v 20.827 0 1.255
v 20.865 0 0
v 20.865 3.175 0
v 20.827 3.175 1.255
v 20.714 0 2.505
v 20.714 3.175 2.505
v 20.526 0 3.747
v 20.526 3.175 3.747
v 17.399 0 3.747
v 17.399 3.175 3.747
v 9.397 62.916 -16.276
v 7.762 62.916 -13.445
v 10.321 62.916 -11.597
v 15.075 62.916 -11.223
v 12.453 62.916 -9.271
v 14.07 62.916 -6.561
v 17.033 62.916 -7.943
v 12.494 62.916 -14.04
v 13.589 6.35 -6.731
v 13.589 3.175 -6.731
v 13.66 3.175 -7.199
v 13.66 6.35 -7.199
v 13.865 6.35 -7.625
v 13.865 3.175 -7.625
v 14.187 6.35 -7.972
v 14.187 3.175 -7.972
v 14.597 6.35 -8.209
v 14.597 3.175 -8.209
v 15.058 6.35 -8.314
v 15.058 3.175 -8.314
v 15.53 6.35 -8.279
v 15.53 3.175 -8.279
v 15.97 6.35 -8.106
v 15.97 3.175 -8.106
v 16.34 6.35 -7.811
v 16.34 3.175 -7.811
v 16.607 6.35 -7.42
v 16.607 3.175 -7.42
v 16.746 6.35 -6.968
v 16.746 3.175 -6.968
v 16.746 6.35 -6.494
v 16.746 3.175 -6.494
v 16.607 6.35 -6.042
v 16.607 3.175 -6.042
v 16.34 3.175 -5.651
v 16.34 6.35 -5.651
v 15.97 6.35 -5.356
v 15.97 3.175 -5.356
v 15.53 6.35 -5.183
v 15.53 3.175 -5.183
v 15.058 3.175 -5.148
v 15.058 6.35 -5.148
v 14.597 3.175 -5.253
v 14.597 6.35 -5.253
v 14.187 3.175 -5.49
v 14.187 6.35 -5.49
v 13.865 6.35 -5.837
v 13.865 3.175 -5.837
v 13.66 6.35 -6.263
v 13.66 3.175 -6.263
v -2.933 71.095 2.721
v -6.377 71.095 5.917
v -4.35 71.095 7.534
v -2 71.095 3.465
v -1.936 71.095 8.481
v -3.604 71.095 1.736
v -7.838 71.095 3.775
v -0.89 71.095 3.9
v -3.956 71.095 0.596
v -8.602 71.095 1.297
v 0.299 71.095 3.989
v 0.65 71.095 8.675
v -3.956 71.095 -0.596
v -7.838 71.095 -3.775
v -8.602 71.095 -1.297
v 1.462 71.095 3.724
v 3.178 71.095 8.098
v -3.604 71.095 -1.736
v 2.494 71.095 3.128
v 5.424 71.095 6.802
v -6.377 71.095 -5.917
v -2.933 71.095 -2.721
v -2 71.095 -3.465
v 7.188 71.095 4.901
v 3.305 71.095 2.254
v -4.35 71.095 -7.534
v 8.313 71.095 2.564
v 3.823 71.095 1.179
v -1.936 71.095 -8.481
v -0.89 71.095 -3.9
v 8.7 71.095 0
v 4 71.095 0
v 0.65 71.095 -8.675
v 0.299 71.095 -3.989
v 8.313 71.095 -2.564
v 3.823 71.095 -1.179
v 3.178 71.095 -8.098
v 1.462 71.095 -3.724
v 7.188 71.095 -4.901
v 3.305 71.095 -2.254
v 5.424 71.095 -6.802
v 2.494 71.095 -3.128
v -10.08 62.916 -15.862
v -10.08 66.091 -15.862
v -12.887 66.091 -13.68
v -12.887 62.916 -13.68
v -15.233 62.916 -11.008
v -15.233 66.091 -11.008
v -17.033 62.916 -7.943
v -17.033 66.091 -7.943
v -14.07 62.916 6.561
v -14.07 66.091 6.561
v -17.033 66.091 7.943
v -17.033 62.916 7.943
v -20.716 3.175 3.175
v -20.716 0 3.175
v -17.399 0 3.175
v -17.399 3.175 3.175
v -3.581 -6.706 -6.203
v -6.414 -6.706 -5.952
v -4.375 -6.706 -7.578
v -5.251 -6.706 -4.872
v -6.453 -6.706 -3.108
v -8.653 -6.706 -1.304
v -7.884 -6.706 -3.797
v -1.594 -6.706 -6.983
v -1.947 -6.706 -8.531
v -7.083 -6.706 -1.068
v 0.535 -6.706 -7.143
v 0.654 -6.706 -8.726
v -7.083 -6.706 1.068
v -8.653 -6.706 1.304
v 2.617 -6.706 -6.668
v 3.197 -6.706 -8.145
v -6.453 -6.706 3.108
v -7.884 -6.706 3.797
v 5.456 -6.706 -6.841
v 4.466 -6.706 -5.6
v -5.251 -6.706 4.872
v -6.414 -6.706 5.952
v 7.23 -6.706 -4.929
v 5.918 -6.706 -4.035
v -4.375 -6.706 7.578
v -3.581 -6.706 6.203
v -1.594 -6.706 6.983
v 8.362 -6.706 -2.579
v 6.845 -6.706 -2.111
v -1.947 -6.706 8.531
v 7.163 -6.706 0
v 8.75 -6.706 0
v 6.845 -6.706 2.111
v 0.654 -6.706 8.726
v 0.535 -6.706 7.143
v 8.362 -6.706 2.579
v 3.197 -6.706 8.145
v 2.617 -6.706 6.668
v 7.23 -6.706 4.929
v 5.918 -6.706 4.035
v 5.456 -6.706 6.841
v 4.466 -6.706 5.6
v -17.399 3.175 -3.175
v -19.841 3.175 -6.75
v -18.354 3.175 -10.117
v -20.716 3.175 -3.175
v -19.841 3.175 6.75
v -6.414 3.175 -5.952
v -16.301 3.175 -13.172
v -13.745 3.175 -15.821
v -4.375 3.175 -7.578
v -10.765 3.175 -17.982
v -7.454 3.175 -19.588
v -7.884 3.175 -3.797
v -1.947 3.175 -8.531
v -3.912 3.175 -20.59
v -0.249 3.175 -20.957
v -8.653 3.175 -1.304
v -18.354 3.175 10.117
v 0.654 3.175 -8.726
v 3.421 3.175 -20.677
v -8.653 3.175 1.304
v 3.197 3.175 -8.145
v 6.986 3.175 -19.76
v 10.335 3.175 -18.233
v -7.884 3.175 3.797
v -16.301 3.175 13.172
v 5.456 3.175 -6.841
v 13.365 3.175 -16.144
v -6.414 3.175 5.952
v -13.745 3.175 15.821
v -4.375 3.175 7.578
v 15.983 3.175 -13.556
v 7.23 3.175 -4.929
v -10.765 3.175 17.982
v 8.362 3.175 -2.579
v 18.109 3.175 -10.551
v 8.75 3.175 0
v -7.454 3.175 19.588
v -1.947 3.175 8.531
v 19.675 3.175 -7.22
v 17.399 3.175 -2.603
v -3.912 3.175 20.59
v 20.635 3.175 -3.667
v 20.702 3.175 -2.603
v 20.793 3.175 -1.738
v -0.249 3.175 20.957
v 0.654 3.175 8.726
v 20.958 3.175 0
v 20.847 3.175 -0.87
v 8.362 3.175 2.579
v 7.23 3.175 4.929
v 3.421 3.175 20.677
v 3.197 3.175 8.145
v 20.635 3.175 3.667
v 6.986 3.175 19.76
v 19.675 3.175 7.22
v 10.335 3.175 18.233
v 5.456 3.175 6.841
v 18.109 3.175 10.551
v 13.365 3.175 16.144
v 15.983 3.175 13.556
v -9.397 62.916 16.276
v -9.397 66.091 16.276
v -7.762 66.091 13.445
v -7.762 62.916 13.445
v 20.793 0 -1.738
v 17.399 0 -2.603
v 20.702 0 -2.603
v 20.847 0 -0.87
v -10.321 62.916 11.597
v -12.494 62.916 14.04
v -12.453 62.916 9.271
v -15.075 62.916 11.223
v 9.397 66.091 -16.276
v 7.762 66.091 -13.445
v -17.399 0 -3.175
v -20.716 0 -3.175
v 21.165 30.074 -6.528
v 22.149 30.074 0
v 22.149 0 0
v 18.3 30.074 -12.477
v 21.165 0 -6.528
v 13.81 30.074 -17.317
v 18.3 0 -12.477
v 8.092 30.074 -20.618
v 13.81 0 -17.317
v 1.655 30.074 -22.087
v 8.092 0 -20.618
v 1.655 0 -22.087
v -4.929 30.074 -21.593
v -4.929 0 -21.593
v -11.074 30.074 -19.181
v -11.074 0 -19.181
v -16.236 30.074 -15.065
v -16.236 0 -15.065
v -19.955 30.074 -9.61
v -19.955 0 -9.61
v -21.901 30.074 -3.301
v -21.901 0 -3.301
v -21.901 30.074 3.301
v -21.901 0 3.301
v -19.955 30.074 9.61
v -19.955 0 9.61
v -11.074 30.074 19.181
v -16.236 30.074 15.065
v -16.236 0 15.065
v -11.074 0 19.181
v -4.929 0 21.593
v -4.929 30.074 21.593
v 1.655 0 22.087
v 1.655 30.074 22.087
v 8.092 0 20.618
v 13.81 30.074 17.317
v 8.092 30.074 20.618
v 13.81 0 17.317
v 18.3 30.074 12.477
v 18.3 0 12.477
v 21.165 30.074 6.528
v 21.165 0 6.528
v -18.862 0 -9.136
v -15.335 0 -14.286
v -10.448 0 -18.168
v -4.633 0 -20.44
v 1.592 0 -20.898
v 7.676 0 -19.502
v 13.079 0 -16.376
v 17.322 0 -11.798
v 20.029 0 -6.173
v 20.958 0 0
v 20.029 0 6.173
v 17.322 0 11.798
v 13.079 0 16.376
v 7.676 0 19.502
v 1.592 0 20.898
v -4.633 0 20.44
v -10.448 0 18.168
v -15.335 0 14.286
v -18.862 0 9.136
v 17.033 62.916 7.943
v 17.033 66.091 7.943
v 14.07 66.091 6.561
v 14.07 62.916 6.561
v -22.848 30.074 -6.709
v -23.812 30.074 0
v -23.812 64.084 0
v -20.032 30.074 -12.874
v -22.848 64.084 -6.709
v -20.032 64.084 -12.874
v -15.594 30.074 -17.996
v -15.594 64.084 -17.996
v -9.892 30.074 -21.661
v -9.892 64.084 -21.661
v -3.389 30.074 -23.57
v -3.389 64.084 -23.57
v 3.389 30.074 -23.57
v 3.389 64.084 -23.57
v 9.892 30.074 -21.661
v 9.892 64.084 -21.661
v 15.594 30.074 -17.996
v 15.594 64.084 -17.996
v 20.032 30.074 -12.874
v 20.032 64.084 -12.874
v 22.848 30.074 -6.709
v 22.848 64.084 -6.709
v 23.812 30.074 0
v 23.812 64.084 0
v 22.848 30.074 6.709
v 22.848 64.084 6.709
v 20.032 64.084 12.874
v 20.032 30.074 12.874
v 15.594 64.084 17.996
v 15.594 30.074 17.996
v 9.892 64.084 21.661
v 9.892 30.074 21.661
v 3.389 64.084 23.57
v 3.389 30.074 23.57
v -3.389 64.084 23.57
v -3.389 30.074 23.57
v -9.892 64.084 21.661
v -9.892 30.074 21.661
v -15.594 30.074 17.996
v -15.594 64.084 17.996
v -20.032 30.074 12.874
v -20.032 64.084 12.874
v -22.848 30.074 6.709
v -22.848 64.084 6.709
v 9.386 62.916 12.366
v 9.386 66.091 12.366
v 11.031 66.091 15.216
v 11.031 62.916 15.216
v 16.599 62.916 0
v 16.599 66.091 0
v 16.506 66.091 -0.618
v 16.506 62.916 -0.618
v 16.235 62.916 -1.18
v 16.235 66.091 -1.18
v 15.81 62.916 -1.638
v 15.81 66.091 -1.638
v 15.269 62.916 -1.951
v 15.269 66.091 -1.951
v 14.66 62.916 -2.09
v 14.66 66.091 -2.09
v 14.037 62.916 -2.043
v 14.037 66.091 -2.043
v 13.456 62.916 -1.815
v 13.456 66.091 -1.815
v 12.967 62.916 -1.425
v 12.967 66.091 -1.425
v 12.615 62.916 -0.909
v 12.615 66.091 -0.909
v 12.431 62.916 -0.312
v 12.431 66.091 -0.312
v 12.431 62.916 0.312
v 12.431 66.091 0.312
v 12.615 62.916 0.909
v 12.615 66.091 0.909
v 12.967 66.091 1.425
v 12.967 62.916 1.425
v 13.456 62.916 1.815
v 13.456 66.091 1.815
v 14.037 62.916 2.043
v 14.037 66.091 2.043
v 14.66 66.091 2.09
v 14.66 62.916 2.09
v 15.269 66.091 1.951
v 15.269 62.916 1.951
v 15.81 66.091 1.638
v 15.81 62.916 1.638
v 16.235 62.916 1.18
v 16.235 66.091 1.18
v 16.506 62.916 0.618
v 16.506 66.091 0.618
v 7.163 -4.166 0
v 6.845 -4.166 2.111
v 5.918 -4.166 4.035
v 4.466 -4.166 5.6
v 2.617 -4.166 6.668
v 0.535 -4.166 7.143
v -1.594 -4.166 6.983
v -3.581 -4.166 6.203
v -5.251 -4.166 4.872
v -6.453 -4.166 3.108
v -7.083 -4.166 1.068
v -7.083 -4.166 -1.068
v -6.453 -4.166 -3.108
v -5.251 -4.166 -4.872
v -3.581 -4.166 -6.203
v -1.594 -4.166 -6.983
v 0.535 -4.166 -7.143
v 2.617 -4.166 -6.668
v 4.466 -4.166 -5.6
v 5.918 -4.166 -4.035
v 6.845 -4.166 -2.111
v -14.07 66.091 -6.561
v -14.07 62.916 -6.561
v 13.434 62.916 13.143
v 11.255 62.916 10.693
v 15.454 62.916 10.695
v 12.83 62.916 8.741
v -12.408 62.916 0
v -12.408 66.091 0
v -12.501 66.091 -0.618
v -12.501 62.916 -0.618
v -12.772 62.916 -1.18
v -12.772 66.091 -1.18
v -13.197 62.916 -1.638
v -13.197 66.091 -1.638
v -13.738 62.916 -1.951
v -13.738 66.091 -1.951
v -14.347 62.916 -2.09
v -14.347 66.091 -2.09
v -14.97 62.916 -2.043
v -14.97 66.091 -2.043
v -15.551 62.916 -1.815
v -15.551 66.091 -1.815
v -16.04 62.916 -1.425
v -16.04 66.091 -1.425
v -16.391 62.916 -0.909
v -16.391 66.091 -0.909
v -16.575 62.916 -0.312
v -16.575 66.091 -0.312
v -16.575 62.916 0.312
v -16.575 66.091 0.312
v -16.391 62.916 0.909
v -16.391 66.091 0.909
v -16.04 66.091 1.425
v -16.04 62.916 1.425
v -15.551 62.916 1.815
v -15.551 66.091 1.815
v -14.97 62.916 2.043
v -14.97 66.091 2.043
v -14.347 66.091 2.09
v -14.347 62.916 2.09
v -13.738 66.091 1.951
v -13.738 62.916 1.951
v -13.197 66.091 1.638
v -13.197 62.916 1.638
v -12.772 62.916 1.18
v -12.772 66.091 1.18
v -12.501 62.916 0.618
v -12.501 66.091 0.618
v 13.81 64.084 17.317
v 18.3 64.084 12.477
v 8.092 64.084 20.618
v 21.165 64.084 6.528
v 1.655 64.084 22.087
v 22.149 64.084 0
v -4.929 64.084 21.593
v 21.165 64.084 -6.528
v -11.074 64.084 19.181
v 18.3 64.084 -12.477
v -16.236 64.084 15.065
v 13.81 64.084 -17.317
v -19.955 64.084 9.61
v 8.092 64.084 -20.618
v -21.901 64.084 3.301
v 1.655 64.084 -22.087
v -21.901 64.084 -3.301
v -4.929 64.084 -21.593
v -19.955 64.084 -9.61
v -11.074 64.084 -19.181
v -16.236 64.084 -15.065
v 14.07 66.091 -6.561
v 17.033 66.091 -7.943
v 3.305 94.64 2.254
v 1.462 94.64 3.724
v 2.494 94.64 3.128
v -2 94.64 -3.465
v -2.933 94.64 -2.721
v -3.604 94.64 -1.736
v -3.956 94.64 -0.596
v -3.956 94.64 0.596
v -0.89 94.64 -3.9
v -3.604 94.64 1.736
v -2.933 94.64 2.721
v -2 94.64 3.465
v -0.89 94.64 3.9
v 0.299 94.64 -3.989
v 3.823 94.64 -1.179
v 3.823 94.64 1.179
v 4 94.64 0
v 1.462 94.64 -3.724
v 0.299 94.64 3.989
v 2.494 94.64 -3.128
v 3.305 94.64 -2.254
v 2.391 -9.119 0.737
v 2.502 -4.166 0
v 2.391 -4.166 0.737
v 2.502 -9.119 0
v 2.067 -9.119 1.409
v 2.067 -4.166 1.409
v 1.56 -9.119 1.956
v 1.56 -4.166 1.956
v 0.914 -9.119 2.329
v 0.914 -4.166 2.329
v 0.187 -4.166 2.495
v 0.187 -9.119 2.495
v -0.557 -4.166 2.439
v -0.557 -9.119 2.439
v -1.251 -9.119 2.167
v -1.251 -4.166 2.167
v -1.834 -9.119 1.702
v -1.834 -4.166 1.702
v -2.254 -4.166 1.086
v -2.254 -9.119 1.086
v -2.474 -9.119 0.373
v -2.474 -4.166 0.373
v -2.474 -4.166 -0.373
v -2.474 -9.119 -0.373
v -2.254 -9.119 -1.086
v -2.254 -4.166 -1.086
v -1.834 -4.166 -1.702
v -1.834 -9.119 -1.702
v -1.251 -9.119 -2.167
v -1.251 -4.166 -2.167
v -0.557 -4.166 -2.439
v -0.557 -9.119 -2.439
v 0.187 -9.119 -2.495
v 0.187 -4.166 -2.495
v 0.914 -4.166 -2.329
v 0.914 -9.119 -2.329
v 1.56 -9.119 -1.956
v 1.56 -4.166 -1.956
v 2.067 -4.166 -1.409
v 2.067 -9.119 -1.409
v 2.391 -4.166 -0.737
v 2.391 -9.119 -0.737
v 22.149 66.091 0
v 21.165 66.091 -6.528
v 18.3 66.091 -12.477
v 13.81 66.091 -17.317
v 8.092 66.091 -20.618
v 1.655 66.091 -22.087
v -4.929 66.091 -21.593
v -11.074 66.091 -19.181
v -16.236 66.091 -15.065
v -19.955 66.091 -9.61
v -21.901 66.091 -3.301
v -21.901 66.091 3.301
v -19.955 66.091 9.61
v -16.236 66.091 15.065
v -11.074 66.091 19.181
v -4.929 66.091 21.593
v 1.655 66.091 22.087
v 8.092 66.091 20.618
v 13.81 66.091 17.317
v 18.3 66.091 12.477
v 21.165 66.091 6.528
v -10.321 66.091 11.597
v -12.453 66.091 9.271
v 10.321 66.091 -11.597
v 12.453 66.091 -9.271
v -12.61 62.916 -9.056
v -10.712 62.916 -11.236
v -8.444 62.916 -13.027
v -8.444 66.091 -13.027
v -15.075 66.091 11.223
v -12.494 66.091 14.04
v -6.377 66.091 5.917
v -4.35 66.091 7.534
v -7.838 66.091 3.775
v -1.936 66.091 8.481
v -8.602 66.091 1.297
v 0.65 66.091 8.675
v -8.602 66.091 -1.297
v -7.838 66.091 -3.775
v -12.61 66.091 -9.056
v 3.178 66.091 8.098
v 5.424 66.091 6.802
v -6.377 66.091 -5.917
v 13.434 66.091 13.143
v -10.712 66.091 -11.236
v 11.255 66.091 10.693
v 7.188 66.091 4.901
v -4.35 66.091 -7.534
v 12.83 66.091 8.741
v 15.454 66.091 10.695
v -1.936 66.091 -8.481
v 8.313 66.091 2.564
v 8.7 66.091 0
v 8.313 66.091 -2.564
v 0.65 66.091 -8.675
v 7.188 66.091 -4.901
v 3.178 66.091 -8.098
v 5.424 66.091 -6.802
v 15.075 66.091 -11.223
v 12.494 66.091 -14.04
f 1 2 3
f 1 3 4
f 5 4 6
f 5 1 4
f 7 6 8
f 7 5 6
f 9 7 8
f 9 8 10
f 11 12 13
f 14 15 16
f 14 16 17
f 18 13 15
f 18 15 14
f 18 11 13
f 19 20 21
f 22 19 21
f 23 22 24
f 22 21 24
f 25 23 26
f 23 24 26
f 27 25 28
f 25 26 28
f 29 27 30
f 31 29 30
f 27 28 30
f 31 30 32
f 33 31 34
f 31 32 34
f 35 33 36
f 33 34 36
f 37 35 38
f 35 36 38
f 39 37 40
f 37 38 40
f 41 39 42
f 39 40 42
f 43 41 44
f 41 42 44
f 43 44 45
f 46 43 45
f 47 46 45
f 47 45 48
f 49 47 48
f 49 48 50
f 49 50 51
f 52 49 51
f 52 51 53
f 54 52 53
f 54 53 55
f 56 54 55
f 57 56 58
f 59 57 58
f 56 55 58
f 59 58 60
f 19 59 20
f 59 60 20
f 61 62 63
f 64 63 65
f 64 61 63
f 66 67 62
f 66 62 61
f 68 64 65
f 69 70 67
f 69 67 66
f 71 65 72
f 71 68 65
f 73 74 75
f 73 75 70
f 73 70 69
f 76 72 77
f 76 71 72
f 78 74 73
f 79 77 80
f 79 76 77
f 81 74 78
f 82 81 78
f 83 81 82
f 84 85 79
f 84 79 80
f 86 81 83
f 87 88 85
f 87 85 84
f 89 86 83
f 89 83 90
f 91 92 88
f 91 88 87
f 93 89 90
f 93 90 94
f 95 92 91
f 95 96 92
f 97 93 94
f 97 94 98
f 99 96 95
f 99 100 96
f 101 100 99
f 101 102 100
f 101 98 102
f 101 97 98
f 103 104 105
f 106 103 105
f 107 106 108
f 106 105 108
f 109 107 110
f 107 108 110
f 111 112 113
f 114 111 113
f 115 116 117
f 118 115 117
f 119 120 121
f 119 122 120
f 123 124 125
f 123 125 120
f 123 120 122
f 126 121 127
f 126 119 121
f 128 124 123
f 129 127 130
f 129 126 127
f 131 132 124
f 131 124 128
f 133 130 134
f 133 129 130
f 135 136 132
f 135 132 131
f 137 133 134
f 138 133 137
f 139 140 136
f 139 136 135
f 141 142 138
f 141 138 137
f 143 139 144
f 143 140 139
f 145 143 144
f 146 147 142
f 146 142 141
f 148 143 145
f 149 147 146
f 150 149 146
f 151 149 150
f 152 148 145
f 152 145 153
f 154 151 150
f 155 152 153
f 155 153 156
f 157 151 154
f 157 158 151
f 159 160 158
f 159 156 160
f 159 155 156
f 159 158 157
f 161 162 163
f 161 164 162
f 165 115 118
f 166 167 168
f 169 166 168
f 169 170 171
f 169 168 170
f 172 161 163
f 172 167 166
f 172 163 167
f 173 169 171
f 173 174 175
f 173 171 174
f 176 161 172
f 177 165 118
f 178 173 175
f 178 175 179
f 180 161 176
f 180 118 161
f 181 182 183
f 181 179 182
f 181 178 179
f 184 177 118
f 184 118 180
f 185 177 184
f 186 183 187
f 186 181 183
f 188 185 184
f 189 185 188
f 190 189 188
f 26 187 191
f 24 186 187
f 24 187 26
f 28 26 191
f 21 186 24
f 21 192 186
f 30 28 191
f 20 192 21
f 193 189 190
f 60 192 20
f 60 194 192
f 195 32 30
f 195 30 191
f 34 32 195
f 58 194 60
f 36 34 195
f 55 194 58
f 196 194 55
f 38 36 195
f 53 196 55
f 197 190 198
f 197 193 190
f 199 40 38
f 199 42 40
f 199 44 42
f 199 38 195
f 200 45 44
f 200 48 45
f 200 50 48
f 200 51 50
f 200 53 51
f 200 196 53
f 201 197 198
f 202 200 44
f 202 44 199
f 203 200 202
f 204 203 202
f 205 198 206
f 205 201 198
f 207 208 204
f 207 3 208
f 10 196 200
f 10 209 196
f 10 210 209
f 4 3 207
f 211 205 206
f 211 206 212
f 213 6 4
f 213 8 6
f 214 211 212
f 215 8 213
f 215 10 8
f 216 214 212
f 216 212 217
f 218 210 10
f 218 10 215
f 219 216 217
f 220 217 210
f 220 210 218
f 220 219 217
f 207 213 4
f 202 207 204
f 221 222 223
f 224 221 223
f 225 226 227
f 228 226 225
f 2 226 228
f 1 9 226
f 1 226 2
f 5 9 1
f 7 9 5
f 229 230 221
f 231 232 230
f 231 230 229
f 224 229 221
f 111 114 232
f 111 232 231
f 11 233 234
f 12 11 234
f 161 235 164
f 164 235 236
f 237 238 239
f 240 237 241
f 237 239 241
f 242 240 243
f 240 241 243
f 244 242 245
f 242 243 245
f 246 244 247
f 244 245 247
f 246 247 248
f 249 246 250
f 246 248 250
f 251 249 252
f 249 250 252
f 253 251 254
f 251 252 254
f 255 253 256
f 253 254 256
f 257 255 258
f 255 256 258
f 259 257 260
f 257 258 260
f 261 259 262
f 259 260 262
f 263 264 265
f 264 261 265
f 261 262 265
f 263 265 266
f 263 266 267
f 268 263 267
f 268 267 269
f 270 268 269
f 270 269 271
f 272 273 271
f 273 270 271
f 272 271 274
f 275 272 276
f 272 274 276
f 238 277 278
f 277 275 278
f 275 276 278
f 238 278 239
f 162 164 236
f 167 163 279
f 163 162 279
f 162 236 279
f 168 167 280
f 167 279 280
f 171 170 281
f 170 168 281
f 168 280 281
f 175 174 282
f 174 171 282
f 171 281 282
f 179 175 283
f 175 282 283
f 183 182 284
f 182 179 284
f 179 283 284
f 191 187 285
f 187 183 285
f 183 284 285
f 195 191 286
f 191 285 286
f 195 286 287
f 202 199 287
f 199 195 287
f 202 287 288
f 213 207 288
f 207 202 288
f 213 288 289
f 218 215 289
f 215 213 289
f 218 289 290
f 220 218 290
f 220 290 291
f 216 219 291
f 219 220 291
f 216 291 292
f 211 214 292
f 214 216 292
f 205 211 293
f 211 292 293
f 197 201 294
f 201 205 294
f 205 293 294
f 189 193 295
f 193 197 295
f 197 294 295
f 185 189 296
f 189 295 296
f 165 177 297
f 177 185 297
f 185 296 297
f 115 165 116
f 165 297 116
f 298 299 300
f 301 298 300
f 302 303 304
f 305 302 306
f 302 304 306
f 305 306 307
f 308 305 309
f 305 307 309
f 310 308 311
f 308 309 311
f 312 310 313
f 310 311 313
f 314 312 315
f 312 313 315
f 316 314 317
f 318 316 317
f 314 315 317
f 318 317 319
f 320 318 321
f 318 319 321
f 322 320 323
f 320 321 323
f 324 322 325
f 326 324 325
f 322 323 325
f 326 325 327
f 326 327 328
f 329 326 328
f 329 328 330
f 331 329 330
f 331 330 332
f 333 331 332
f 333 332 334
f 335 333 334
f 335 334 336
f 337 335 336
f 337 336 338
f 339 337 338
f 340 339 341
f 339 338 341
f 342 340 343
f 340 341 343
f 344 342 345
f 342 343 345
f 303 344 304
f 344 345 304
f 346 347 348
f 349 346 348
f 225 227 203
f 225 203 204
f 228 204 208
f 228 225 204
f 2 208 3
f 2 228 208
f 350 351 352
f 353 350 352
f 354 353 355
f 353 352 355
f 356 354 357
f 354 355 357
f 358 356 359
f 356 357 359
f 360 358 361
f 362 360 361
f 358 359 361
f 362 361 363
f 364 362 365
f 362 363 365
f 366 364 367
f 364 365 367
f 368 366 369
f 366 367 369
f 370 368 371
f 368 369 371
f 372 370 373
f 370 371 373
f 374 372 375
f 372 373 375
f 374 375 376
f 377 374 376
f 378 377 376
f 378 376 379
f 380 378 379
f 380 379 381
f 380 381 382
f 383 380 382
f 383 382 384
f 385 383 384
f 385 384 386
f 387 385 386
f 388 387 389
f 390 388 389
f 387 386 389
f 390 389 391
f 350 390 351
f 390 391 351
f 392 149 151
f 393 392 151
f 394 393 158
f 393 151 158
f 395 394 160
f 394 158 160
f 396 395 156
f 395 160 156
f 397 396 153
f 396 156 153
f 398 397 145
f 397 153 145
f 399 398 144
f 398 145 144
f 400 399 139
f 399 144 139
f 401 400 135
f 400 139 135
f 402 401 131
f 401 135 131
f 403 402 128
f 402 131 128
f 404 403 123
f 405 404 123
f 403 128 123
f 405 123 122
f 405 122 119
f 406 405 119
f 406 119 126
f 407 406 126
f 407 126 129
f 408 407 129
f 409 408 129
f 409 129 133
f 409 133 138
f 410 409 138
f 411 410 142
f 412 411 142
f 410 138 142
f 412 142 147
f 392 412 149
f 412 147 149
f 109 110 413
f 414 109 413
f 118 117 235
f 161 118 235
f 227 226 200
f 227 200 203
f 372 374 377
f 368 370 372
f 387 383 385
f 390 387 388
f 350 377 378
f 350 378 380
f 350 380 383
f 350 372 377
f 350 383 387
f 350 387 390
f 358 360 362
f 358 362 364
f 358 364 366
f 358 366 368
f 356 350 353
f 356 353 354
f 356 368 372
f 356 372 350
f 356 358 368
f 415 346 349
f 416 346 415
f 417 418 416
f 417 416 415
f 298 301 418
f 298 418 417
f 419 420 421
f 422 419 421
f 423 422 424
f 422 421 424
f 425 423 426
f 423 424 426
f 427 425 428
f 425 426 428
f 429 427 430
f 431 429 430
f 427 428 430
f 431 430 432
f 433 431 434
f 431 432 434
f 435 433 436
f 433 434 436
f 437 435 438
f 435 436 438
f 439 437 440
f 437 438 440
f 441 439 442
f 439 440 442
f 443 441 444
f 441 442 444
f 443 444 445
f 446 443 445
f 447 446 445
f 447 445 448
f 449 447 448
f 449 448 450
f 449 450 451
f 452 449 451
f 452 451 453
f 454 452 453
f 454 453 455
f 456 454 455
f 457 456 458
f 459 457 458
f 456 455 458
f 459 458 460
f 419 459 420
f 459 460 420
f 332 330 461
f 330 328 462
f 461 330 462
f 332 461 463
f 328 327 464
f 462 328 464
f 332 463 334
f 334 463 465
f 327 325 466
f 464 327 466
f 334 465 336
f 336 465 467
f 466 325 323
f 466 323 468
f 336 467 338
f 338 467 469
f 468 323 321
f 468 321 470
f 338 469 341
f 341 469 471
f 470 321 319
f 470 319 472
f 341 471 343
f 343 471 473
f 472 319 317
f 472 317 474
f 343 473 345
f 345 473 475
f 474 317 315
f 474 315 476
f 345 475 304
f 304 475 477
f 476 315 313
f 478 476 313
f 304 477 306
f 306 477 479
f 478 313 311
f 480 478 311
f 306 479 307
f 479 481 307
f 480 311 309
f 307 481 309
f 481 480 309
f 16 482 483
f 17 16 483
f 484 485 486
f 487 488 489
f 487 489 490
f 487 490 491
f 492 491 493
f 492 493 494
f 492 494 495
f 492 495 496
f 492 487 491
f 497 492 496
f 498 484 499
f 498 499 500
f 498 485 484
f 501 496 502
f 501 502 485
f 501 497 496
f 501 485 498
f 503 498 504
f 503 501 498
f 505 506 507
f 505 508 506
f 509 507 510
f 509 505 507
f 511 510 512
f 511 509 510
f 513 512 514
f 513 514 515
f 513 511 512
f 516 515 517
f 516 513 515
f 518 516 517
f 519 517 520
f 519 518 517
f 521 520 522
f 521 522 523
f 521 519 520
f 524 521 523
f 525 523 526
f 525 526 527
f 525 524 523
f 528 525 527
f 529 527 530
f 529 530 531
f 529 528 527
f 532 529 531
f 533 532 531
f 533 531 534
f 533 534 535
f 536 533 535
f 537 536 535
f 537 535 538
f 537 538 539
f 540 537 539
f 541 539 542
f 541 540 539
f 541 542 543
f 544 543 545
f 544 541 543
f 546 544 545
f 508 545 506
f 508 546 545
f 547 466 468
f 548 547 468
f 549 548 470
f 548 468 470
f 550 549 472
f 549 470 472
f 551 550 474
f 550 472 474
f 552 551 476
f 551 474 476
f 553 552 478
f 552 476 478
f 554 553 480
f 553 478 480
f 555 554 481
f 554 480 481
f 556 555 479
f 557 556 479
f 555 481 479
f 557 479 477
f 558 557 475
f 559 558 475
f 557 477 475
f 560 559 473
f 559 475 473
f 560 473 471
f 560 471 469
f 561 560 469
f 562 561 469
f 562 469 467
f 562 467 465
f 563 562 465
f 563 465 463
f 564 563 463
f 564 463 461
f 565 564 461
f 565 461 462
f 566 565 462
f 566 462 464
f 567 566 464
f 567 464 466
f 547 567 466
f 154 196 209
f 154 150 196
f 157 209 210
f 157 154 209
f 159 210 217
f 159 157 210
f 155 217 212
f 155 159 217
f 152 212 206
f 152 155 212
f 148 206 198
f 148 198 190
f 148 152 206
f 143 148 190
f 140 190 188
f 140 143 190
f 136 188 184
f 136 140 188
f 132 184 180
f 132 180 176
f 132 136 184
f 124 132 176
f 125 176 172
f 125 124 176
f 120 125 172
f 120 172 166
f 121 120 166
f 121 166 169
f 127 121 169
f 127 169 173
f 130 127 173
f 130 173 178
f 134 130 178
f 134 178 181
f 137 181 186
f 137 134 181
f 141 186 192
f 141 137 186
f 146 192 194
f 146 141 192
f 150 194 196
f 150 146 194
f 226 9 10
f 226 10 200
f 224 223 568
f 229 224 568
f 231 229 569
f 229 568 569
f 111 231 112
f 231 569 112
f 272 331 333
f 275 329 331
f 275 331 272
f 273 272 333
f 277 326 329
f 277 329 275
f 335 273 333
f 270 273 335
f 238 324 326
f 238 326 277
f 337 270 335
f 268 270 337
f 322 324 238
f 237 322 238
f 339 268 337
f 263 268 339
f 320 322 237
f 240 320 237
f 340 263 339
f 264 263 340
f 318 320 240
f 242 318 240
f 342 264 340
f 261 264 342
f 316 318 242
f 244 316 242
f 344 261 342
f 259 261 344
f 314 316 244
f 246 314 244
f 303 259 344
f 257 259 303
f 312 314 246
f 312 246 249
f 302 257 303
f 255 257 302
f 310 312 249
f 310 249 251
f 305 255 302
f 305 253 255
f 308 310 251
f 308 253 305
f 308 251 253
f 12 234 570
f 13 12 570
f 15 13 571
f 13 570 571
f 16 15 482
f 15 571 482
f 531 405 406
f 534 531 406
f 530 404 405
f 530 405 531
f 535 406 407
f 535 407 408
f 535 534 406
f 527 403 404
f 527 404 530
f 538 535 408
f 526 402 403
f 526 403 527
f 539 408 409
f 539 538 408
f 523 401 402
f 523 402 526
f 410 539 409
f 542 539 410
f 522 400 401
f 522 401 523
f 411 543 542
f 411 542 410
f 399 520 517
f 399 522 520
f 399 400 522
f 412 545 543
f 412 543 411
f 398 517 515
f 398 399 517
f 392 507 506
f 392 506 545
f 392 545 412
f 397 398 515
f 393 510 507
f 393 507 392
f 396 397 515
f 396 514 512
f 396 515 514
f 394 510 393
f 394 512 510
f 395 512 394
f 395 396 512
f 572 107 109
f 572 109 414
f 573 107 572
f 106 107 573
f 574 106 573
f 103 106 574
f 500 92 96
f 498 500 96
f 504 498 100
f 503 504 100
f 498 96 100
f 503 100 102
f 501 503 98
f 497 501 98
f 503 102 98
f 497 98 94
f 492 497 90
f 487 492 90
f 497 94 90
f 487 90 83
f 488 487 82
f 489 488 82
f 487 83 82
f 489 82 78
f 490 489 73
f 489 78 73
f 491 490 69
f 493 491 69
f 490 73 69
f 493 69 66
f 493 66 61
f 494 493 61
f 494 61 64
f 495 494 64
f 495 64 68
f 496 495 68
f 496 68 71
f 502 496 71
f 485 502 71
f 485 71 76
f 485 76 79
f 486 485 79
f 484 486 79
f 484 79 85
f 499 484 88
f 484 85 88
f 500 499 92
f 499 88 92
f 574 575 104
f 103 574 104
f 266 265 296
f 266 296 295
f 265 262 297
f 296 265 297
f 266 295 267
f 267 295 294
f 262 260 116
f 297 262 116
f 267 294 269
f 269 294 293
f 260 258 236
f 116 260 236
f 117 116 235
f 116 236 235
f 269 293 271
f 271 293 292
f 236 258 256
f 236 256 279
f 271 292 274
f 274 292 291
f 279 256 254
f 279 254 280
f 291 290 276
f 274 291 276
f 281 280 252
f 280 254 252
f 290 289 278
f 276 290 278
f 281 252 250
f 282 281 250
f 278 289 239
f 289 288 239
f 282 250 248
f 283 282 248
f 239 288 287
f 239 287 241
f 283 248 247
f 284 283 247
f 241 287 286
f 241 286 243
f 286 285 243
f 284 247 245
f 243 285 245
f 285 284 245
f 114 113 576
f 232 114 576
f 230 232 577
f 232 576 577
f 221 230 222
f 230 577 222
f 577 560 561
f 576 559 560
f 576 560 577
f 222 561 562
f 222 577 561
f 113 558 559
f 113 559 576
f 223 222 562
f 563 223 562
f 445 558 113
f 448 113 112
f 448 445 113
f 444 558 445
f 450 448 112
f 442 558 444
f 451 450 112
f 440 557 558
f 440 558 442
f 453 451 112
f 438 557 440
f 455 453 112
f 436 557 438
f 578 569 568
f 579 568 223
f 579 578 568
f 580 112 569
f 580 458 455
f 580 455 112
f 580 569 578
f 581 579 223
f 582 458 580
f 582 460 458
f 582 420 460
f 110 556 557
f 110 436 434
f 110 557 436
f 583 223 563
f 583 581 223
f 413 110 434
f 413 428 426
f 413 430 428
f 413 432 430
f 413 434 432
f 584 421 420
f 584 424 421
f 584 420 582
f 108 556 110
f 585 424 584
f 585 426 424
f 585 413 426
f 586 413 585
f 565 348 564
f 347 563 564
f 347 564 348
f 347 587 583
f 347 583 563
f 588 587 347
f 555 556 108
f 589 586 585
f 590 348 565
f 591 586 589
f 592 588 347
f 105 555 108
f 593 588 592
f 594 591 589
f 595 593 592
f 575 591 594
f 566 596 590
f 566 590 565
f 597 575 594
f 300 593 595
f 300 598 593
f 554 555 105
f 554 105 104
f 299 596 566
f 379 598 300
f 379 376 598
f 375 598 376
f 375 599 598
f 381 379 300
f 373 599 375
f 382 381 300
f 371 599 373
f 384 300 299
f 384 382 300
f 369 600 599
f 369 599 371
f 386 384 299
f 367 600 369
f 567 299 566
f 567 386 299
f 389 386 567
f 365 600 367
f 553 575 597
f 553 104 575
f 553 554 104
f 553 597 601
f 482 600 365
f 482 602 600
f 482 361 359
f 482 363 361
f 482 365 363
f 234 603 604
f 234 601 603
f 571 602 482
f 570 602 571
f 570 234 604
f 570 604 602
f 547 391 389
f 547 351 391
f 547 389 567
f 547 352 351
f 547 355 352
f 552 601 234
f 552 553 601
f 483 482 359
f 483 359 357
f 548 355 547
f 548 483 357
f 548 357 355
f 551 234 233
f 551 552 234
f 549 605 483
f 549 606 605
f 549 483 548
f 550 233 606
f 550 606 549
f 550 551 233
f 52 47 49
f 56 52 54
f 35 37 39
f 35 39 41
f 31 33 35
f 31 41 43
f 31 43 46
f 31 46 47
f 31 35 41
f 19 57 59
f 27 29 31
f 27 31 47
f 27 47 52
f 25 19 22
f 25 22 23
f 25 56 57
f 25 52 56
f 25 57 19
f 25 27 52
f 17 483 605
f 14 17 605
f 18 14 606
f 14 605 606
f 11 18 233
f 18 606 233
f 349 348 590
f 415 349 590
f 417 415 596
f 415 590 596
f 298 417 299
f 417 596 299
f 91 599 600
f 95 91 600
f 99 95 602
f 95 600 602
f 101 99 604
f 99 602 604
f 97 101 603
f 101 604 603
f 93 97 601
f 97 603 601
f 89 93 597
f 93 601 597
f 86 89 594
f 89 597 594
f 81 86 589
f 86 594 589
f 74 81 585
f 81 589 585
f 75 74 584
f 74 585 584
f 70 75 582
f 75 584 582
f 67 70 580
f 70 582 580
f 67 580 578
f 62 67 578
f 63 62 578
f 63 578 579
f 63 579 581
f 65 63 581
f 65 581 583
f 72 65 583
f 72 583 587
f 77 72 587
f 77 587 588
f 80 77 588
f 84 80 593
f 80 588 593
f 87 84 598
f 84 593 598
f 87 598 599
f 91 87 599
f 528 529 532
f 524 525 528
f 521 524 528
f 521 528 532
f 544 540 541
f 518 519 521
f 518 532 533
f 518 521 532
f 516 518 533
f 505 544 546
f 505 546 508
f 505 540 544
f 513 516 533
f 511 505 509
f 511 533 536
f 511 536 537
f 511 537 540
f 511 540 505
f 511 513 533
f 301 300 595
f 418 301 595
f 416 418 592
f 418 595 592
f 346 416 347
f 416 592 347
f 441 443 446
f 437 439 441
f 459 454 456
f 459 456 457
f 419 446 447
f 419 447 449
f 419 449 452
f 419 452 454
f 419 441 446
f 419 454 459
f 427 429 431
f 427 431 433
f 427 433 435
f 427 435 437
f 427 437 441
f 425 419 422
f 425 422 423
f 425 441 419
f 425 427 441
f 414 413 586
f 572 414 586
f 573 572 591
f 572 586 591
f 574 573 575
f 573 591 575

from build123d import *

# Parameters (mm, degrees)
SKETCH2_R            = 22.1488
BOSS_EXTRUDE4_DEPTH  = 66.0908
SKETCH4_R            = 8.6995
BOSS_EXTRUDE5_DEPTH  = 5.0038
SKETCH9_R            = 4.0005
BOSS_EXTRUDE6_DEPTH  = 23.5458
SKETCH10_R           = 8.7503
BOSS_EXTRUDE7_DEPTH  = 6.7056
SKETCH11_R           = 2.5019
BOSS_EXTRUDE8_DEPTH  = 2.413
SKETCH12_R           = 23.8125
BOSS_EXTRUDE9_DEPTH  = 34.0106
SKETCH13_R           = 2.0955
CUT_EXTRUDE1_DEPTH   = 3.175
CUT_EXTRUDE2_DEPTH   = 3.175
SKETCH15_R           = 20.958175
SKETCH15_R_2         = 8.7503
CUT_EXTRUDE3_DEPTH   = 3.175
SKETCH16_R           = 7.1628
SKETCH16_R_2         = 2.5019
CUT_EXTRUDE4_DEPTH   = 2.54
BOSS_EXTRUDE12_DEPTH = 3.175
BOSS_EXTRUDE13_DEPTH = 3.175
SKETCH20_R           = 1.5875
CUT_EXTRUDE5_DEPTH   = 3.175


with BuildPart() as part:
    # Sketch2 → Boss-Extrude4 (new body)
    with BuildSketch(Plane(origin=(0, 0, 0), x_dir=(1, 0, 0), z_dir=(0, 1, 0))):
        Circle(SKETCH2_R)
    extrude(amount=BOSS_EXTRUDE4_DEPTH)

    # Sketch4 → Boss-Extrude5 (add)
    with BuildSketch(Plane(origin=(0, 66.0908, 0), x_dir=(1, 0, 0), z_dir=(0, 1, 0))):
        Circle(SKETCH4_R)
    extrude(amount=BOSS_EXTRUDE5_DEPTH)

    # Sketch9 → Boss-Extrude6 (add)
    with BuildSketch(Plane(origin=(0, 71.0946, 0), x_dir=(1, 0, 0), z_dir=(0, 1, 0))):
        Circle(SKETCH9_R)
    extrude(amount=BOSS_EXTRUDE6_DEPTH)

    # Sketch10 → Boss-Extrude7 (add)
    with BuildSketch(Plane.XZ):
        Circle(SKETCH10_R)
    extrude(amount=BOSS_EXTRUDE7_DEPTH)

    # Sketch11 → Boss-Extrude8 (add)
    with BuildSketch(Plane.XZ.offset(6.7056)):
        Circle(SKETCH11_R)
    extrude(amount=BOSS_EXTRUDE8_DEPTH)

    # Sketch12 → Boss-Extrude9 (add)
    with BuildSketch(Plane(origin=(0, 64.0842, 0), x_dir=(-1, 0, 0), z_dir=(0, -1, 0))):
        Circle(SKETCH12_R)
    extrude(amount=BOSS_EXTRUDE9_DEPTH)

    # Sketch13 → Cut-Extrude1 (cut)
    with BuildSketch(Plane(origin=(0, 66.0908, 0), x_dir=(1, 0, 0), z_dir=(0, 1, 0))):
        with Locations((-14.5034, 0)):
            Circle(SKETCH13_R)
        with Locations((14.5034, 0)):
            Circle(SKETCH13_R)
    extrude(amount=-CUT_EXTRUDE1_DEPTH, mode=Mode.SUBTRACT)

    # Sketch14 → Cut-Extrude2 (cut)
    with BuildSketch(Plane(origin=(0, 66.0908, 0), x_dir=(1, 0, 0), z_dir=(0, 1, 0))):
        with BuildLine():
            Line((-14.070005184, -6.560951168), (-17.033311719, -7.942763698))
            ThreePointArc((-17.033311719, -7.942763698), (-13.856523006, -12.697163994), (-9.397090019, -16.276237356))
            Line((-9.397090019, -16.276237356), (-7.76226652, -13.444639995))
            ThreePointArc((-7.76226652, -13.444639995), (-11.445886375, -10.4882225), (-14.070005184, -6.560951168))
        make_face()
        with BuildLine():
            ThreePointArc((-10.080336815, 15.862156631), (-14.123267338, 12.399779151), (-17.033311719, 7.942763698))
            Line((-17.033311719, 7.942763698), (-14.070005184, 6.560951168))
            ThreePointArc((-14.070005184, 6.560951168), (-11.711998853, 10.190201616), (-8.44372295, 13.027458265))
            Line((-8.44372295, 13.027458265), (-10.080336815, 15.862156631))
        make_face()
        with BuildLine():
            ThreePointArc((17.033311719, 7.942763698), (13.856523006, 12.697163994), (9.397090019, 16.276237356))
            Line((9.397090019, 16.276237356), (7.76226652, 13.444639995))
            ThreePointArc((7.76226652, 13.444639995), (11.445886375, 10.4882225), (14.070005184, 6.560951168))
            Line((14.070005184, 6.560951168), (17.033311719, 7.942763698))
        make_face()
        with BuildLine():
            Line((9.385927189, -12.365900571), (11.031460095, -15.21604717))
            ThreePointArc((11.031460095, -15.21604717), (14.495965555, -11.961947414), (17.033311719, -7.942763698))
            Line((17.033311719, -7.942763698), (14.070005184, -6.560951168))
            ThreePointArc((14.070005184, -6.560951168), (12.081785889, -9.748926908), (9.385927189, -12.365900571))
        make_face()
    extrude(amount=-CUT_EXTRUDE2_DEPTH, mode=Mode.SUBTRACT)

    # Sketch15 → Cut-Extrude3 (cut)
    with BuildSketch(Plane.XZ):
        Circle(SKETCH15_R)
        Circle(SKETCH15_R_2, mode=Mode.SUBTRACT)
    extrude(amount=-CUT_EXTRUDE3_DEPTH, mode=Mode.SUBTRACT)

    # Sketch16 → Cut-Extrude4 (cut)
    with BuildSketch(Plane.XZ.offset(6.7056)):
        Circle(SKETCH16_R)
        Circle(SKETCH16_R_2, mode=Mode.SUBTRACT)
    extrude(amount=-CUT_EXTRUDE4_DEPTH, mode=Mode.SUBTRACT)

    # Sketch18 → Boss-Extrude12 (add)
    with BuildSketch(Plane.XZ):
        with BuildLine():
            ThreePointArc((20.865163654, 0), (20.780212376, 1.88091146), (20.52605029, 3.746506881))
            Line((20.52605029, 3.746506881), (17.399, 3.746506881))
            Line((17.399, 3.746506881), (17.399, -2.603493119))
            Line((17.399, -2.603493119), (20.702098393, -2.603493119))
            ThreePointArc((20.702098393, -2.603493119), (20.824357436, -1.304297387), (20.865163654, 0))
        make_face()
    extrude(amount=-BOSS_EXTRUDE12_DEPTH)

    # Sketch19 → Boss-Extrude13 (add)
    with BuildSketch(Plane(origin=(0, 0, 0), x_dir=(-1, 0, 0), z_dir=(0, -1, 0))):
        with BuildLine():
            Line((20.716285244, -3.175), (17.399, -3.175))
            Line((17.399, -3.175), (17.399, 3.175))
            Line((17.399, 3.175), (20.716285244, 3.175))
            ThreePointArc((20.716285244, 3.175), (20.958175, 0), (20.716285244, -3.175))
        make_face()
    extrude(amount=-BOSS_EXTRUDE13_DEPTH)

    # Sketch20 → Cut-Extrude5 (cut)
    with BuildSketch(Plane(origin=(0, 3.175, 0), x_dir=(-1, 0, 0), z_dir=(0, -1, 0))):
        with Locations((-15.1765, 6.730993119)):
            Circle(SKETCH20_R)
    extrude(amount=-CUT_EXTRUDE5_DEPTH, mode=Mode.SUBTRACT)


solid = part.part
